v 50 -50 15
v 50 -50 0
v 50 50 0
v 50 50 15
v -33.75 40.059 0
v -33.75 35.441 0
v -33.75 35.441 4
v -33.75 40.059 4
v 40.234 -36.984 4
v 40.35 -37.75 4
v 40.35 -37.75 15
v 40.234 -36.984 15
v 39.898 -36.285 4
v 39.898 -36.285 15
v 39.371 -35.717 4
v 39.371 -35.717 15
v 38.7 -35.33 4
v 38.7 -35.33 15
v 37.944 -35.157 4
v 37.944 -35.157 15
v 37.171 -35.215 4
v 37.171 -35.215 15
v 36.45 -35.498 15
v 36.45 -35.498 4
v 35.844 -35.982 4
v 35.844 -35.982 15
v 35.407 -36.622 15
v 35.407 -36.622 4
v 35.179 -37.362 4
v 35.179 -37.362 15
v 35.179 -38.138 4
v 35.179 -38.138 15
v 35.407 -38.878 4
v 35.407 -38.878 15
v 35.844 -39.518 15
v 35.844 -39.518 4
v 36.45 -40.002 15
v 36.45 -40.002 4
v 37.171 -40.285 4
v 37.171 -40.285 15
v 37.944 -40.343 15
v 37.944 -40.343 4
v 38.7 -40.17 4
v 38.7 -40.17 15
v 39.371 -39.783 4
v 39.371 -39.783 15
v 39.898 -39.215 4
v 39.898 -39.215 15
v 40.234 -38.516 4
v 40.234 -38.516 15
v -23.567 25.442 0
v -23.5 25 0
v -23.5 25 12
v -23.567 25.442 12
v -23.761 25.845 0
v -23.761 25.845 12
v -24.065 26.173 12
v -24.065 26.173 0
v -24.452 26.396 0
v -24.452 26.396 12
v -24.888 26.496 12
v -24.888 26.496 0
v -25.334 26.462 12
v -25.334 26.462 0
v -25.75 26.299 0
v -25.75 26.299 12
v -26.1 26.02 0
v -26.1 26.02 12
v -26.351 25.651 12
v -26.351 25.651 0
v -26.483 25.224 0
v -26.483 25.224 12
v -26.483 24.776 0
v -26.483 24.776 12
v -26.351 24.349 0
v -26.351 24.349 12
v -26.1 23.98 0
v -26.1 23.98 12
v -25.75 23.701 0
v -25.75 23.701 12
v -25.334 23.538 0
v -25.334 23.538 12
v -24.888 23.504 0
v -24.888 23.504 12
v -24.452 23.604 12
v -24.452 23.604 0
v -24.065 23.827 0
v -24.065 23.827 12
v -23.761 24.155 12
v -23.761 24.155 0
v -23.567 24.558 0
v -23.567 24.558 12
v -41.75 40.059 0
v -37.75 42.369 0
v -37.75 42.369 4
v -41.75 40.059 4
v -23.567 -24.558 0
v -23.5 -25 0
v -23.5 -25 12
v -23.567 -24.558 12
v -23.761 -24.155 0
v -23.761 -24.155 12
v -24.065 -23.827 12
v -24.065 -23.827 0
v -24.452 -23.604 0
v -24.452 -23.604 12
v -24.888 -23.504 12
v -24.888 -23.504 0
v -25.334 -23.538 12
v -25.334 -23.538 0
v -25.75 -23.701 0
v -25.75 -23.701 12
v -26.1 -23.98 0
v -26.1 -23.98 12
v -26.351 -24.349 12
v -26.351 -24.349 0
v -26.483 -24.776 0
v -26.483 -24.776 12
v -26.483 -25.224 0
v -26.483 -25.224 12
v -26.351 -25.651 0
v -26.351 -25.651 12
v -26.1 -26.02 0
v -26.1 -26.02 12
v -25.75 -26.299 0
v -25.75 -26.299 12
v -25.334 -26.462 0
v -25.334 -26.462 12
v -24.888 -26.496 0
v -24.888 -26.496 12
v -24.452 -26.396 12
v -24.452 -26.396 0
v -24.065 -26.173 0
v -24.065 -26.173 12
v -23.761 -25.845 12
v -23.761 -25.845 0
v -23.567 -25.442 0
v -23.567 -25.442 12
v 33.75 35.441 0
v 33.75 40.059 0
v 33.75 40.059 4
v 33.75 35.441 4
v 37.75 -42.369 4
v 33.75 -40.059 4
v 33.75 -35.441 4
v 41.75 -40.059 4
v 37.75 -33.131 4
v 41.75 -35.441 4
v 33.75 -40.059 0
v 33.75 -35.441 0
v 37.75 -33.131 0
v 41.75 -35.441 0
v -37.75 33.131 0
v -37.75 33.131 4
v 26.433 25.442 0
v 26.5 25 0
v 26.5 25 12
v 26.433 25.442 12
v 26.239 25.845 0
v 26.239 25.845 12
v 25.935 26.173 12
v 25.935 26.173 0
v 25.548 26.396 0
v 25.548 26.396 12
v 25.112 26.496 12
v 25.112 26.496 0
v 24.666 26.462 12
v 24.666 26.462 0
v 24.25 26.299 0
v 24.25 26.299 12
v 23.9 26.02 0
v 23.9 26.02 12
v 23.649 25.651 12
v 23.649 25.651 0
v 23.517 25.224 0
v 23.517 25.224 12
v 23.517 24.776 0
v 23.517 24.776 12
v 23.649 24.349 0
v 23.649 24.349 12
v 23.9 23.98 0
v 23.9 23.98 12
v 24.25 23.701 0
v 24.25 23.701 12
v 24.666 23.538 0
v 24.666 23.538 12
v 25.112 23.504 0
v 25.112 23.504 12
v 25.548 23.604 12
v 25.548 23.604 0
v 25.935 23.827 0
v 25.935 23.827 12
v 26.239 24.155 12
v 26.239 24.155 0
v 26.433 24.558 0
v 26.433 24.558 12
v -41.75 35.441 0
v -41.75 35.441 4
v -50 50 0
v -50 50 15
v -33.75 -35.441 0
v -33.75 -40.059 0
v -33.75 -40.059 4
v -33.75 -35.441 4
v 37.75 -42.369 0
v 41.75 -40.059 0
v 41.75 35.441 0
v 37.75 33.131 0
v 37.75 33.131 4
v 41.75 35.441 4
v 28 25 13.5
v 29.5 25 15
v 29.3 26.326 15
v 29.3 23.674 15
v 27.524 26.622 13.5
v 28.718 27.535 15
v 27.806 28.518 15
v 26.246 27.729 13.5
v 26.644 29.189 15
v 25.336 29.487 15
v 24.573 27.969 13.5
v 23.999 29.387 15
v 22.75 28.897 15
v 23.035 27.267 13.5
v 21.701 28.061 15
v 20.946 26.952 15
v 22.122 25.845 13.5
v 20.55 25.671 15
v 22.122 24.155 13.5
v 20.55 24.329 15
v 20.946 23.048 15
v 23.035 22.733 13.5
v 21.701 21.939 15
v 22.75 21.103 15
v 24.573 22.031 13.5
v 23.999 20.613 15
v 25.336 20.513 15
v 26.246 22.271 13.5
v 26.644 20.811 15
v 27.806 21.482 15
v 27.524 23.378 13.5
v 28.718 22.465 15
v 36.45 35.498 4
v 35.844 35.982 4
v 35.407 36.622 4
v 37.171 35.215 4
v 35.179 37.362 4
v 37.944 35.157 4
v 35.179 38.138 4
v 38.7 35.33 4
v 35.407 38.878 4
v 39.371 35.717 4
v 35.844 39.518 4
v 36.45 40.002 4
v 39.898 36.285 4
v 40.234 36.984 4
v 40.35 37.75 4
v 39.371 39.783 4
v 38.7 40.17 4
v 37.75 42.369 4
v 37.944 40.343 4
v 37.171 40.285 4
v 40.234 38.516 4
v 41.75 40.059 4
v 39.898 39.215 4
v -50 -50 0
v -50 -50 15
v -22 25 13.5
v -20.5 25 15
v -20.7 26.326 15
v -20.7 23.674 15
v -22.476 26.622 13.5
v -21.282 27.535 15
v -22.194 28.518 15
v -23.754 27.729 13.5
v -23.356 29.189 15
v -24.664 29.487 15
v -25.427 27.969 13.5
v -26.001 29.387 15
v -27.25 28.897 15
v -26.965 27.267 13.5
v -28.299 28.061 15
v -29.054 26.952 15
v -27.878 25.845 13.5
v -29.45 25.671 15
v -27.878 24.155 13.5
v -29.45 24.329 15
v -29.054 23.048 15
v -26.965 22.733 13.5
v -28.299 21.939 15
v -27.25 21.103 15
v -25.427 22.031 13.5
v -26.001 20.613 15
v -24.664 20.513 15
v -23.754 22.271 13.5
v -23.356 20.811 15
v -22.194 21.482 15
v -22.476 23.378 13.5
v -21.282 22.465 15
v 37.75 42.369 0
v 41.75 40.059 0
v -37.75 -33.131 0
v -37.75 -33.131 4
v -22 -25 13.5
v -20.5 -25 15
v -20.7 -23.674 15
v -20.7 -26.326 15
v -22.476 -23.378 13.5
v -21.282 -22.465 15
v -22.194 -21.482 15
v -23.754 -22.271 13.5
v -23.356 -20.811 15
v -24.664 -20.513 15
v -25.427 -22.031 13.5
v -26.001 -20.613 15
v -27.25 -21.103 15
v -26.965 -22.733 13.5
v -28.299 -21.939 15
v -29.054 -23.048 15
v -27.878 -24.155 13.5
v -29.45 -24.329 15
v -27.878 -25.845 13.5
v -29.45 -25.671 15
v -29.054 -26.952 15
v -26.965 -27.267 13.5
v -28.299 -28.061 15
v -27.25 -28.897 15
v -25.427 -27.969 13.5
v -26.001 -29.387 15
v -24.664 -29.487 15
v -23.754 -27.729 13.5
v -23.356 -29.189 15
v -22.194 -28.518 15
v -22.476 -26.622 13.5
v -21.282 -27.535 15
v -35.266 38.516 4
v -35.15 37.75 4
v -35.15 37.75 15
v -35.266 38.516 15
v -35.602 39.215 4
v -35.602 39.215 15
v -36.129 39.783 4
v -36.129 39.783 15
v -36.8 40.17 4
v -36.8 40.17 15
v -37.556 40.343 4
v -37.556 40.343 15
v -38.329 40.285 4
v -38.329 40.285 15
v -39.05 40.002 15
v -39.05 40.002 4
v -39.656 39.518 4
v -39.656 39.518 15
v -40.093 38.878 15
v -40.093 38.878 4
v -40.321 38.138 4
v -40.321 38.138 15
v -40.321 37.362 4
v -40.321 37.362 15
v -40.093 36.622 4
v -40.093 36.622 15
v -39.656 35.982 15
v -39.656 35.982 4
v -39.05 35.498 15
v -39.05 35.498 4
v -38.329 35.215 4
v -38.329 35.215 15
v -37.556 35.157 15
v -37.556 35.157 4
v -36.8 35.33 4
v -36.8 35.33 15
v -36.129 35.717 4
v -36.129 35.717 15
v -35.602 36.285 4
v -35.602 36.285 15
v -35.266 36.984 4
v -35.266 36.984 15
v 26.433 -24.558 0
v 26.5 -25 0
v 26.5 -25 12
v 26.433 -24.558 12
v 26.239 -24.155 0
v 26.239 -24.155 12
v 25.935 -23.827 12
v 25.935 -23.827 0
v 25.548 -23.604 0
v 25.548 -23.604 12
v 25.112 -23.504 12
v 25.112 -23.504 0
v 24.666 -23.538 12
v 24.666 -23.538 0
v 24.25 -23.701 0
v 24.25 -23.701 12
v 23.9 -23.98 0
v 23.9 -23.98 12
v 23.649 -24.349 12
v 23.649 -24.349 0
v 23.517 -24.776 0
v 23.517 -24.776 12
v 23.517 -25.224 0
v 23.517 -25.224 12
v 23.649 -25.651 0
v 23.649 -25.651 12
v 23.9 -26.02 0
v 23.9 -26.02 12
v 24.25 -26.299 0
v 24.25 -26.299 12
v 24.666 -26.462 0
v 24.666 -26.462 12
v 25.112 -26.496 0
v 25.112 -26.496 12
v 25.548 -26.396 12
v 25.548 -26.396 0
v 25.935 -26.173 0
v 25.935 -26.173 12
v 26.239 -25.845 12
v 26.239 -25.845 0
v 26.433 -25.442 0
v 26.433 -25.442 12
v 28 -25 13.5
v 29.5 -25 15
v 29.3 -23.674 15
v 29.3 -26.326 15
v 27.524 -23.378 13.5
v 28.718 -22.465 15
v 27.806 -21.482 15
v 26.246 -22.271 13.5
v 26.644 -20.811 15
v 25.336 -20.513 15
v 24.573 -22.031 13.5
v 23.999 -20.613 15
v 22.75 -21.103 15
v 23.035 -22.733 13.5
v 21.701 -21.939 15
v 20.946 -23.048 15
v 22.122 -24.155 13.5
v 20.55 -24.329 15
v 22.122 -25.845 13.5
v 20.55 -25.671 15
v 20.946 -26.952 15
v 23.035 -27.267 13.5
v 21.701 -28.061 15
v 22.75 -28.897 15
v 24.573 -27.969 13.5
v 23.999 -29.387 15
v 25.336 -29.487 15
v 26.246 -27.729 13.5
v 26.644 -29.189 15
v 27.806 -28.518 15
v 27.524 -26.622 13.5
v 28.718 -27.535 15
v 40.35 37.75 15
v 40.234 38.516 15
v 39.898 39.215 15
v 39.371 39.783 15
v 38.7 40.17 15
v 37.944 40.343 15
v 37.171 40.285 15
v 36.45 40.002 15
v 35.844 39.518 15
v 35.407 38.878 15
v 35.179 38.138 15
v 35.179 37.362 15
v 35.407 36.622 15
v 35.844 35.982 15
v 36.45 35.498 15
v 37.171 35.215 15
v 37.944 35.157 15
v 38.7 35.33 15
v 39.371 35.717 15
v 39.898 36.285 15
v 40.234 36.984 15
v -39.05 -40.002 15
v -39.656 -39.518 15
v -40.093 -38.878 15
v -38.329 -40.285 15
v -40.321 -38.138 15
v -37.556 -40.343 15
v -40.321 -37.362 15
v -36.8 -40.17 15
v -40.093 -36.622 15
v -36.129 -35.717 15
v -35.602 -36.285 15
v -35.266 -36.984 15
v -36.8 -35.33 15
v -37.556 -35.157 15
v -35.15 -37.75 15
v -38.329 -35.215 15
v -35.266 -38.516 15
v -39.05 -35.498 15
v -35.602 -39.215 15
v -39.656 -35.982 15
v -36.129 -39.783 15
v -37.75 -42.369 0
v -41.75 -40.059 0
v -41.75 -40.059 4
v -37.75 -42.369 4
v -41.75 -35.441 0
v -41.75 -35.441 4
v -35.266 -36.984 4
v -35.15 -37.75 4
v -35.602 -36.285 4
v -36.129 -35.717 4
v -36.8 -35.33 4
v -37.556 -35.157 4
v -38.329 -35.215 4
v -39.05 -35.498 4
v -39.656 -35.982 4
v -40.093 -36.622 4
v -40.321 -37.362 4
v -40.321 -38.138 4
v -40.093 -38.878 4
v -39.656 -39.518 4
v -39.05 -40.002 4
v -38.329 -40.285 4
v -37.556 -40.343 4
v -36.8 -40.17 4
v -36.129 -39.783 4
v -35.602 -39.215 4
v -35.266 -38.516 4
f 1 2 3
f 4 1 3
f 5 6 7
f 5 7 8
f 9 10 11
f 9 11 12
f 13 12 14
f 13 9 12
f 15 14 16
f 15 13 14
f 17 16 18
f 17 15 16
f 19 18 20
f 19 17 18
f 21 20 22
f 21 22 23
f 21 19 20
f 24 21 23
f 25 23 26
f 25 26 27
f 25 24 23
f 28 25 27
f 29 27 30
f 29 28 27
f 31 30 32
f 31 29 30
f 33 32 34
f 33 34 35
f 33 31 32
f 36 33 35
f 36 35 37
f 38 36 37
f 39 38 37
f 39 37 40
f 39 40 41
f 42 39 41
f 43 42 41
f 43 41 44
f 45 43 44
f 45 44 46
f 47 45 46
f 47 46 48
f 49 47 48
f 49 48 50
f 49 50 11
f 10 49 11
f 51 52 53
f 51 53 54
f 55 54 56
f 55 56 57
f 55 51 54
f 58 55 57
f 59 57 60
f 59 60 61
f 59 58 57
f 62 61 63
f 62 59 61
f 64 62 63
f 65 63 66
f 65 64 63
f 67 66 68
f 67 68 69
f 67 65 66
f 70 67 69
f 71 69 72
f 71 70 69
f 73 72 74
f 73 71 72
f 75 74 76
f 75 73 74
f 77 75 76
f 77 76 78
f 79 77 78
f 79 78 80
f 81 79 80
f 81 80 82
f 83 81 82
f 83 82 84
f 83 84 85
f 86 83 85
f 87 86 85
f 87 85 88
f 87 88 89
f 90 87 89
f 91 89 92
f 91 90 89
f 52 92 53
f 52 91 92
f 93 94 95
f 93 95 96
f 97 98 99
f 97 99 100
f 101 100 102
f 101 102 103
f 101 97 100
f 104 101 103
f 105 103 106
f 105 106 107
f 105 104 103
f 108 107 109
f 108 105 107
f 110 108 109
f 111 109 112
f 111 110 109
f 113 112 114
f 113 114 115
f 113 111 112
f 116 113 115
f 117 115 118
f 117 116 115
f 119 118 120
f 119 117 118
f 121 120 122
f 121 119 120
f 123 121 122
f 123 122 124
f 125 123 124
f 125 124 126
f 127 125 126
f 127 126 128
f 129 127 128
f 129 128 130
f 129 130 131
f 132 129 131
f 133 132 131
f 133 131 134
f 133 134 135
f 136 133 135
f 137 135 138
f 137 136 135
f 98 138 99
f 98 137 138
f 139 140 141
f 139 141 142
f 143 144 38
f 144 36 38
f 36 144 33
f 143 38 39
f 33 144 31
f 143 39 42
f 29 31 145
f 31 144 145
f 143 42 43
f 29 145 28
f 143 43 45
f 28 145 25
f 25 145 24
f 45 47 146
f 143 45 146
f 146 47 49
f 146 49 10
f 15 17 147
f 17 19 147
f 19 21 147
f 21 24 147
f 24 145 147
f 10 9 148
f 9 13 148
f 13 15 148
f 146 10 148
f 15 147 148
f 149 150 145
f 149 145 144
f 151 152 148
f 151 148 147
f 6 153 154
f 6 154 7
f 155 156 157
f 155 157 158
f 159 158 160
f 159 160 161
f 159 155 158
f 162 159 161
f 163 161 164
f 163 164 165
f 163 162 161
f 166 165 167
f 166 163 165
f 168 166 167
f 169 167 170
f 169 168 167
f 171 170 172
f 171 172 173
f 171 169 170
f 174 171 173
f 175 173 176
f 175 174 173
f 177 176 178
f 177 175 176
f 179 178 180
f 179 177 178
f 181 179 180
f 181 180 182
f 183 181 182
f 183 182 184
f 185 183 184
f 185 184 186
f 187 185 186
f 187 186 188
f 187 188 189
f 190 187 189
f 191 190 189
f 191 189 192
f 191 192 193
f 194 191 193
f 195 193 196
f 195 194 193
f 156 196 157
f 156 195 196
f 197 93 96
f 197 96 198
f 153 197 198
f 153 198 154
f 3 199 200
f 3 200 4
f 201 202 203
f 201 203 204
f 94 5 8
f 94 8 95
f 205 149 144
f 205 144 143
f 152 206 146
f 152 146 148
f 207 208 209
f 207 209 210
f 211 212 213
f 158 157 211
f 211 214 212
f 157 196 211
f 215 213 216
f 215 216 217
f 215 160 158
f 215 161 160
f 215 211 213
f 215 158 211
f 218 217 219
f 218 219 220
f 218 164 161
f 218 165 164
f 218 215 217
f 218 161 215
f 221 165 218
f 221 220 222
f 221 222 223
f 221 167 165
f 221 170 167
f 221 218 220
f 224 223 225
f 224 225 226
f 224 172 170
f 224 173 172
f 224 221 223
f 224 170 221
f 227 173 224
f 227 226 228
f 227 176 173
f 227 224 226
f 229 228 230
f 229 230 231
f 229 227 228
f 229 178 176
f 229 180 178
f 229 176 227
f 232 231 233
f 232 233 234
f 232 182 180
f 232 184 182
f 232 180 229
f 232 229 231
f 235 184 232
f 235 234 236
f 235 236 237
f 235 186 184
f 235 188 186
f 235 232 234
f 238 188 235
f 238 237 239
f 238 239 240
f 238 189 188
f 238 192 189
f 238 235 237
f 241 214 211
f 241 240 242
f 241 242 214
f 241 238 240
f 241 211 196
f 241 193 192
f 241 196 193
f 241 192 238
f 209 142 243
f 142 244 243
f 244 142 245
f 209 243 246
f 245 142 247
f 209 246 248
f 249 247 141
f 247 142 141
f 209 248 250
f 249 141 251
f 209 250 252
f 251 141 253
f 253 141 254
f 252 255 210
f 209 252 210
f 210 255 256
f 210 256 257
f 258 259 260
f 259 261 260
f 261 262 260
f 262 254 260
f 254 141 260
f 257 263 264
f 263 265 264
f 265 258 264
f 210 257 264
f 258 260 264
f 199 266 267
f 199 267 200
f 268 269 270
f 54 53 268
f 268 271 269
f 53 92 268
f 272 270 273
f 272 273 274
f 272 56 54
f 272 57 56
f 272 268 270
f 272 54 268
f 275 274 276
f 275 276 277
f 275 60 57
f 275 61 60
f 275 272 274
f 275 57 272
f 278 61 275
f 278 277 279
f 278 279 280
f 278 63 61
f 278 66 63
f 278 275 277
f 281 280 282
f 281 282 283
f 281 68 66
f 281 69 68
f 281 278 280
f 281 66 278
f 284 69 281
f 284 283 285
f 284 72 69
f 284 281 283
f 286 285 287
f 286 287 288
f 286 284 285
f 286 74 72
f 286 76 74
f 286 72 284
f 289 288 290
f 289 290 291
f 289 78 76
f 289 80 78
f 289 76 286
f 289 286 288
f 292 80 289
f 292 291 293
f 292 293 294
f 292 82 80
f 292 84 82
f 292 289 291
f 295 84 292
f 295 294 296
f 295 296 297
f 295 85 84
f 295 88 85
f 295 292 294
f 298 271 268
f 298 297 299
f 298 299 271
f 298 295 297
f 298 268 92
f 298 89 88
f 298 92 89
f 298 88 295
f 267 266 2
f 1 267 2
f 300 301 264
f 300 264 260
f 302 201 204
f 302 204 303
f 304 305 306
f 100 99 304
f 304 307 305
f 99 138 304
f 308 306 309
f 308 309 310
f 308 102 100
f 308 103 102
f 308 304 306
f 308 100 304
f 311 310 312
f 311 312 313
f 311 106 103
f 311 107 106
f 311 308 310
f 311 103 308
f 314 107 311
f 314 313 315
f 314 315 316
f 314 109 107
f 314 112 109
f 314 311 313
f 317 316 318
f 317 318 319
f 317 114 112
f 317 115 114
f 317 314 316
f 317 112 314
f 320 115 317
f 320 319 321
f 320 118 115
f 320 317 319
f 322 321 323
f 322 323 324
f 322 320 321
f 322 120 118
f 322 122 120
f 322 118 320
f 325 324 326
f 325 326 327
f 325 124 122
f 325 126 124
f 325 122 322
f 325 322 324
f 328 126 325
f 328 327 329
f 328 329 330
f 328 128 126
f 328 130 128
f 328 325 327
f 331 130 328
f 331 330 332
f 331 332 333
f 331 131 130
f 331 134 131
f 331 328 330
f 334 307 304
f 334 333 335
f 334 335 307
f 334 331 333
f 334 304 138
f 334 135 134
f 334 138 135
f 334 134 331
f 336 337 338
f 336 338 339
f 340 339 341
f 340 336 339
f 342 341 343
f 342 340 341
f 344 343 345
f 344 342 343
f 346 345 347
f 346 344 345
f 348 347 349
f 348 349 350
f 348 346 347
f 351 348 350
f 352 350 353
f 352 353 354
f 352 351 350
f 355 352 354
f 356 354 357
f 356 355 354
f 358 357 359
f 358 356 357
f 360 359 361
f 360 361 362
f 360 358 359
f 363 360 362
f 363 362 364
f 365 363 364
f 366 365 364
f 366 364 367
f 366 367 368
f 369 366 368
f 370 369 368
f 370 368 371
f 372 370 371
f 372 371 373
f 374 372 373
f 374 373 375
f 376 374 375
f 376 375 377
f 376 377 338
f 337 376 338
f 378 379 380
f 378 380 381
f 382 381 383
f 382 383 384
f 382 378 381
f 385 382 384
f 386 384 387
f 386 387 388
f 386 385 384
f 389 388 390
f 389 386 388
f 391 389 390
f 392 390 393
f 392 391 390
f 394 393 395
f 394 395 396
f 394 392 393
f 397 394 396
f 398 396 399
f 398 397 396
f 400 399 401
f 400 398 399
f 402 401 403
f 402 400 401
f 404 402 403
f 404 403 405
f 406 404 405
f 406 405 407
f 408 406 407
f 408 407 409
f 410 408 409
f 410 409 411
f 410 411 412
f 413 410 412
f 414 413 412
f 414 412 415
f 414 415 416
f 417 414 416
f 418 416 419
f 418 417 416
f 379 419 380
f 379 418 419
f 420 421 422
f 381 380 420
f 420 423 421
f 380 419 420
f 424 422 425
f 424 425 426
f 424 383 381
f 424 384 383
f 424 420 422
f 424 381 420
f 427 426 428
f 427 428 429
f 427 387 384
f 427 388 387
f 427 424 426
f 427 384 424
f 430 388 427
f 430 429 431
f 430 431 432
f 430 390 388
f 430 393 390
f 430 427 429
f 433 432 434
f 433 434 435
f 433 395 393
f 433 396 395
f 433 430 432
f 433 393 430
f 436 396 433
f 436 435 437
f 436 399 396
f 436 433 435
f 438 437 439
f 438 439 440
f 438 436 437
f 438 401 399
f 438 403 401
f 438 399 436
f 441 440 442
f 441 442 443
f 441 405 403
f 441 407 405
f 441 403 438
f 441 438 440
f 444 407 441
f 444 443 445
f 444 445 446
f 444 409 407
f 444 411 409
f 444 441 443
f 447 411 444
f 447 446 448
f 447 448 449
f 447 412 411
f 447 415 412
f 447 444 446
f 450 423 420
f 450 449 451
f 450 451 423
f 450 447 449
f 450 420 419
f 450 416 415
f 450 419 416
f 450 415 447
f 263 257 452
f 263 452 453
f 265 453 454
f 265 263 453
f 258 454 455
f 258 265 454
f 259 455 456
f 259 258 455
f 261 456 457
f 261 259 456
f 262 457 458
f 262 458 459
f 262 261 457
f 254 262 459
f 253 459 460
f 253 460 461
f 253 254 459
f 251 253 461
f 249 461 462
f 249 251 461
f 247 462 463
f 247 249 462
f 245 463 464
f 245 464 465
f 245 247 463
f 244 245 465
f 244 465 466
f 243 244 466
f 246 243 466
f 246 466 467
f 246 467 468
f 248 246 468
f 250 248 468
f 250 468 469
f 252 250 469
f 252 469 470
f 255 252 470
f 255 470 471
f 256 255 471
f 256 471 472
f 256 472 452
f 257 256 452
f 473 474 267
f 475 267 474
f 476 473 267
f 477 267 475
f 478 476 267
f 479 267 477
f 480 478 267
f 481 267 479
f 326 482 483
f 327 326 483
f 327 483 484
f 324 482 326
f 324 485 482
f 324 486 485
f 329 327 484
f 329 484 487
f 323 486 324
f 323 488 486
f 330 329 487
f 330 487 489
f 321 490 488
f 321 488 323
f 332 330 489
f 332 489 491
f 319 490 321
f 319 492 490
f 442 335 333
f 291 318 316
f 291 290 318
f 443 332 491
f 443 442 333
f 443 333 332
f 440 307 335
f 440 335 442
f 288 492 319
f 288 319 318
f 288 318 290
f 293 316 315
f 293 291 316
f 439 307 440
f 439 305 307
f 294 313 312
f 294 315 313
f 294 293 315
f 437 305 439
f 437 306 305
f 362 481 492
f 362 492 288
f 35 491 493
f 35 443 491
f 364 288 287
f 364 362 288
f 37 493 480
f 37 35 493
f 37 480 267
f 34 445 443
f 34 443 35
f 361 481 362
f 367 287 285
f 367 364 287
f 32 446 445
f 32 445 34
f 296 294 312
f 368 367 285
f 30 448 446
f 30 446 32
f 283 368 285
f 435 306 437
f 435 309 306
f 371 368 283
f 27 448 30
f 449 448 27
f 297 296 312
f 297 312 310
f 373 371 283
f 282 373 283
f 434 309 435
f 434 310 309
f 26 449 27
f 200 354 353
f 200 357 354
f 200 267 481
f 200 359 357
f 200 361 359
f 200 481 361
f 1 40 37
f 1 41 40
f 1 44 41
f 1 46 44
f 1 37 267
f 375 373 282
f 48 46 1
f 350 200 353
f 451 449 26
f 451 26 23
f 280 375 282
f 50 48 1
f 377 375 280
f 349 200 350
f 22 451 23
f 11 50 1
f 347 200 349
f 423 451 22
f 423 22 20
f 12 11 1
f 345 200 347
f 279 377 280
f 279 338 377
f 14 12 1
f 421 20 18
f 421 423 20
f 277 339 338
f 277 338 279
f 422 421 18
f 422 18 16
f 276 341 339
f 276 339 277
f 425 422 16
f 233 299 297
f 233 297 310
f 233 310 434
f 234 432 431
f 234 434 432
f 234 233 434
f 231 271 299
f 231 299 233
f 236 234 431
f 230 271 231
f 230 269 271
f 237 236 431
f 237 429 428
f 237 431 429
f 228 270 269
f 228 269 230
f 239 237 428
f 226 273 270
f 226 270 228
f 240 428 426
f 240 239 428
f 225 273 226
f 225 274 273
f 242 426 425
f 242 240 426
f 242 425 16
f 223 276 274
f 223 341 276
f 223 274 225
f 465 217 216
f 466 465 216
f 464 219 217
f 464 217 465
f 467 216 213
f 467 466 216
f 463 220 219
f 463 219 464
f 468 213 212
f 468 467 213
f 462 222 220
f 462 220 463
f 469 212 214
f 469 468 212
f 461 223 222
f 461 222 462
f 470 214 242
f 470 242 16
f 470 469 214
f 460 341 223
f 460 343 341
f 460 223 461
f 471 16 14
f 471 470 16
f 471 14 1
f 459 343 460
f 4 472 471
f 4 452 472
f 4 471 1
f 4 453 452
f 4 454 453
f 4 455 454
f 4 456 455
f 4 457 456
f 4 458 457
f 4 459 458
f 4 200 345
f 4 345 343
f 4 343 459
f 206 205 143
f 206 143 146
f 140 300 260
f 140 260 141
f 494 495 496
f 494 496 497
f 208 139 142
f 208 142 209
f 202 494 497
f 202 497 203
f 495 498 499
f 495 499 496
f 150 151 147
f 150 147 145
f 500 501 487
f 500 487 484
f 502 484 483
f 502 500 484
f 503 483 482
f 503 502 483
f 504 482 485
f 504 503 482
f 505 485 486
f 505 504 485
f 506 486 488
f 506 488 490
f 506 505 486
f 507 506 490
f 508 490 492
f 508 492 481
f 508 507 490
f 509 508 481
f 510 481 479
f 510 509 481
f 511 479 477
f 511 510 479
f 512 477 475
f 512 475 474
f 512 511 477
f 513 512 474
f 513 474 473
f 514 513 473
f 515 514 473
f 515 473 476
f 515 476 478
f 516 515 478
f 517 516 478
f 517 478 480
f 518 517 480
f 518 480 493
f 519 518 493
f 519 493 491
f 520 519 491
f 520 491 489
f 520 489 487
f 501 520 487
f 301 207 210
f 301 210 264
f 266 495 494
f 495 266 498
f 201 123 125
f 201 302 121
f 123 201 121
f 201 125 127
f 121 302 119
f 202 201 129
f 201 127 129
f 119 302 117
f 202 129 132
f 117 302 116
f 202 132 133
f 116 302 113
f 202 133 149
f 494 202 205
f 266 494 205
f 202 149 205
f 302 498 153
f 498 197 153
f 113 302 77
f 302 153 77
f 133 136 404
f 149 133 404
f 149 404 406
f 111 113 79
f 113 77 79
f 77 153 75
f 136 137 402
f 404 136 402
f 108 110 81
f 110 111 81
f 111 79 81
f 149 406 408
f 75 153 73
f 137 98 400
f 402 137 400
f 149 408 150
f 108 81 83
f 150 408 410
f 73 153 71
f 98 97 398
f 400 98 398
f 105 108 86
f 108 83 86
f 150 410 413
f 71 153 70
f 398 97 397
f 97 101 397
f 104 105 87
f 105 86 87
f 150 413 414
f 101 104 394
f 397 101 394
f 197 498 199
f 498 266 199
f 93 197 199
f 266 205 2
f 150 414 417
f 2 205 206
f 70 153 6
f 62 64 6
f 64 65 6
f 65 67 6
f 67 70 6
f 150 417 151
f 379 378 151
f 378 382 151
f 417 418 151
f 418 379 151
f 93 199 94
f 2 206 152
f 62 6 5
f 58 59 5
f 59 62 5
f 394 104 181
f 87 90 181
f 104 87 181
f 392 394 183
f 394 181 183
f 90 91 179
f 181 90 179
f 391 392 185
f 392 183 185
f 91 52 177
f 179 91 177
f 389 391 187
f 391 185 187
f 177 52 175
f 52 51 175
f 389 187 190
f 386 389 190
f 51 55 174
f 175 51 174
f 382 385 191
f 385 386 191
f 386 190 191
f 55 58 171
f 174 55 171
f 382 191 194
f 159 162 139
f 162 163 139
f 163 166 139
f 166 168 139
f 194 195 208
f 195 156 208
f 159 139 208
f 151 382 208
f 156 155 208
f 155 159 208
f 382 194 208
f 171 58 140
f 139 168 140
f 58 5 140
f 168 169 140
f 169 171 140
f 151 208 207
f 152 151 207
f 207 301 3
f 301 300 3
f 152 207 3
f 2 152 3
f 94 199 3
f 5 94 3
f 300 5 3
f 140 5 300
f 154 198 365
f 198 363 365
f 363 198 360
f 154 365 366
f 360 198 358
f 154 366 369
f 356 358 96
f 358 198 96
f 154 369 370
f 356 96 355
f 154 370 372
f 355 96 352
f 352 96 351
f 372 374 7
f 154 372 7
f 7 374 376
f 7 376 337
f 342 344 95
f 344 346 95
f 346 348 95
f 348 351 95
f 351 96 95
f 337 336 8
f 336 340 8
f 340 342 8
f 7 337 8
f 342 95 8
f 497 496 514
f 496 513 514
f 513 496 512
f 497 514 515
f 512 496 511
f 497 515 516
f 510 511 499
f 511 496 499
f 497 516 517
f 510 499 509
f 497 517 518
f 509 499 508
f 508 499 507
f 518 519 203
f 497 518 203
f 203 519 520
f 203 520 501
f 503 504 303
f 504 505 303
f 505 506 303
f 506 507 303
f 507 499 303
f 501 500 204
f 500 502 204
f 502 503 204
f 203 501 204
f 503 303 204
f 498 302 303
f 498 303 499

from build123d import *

# Parameters (mm, degrees)
F0_W     = 100
F0_H     = 100
F0_R     = 1.5
F0_R_2   = 2.6
F1_DEPTH = 15
F2_DEPTH = 4
F3_SIZE  = 3


with BuildPart() as f1:
    # F0 (on Top) → F1 (new body)
    with BuildSketch(Plane.XY):
        Rectangle(F0_W, F0_H)
        Polygon((-37.75, -33.131198), (-33.75, -35.440599), (-33.75, -40.059401), (-37.75, -42.368802), (-41.75, -40.059401), (-41.75, -35.440599), align=None, mode=Mode.SUBTRACT)
        with Locations((-25, -25)):
            Circle(F0_R, mode=Mode.SUBTRACT)
        Polygon((37.75, -33.131198), (41.75, -35.440599), (41.75, -40.059401), (37.75, -42.368802), (33.75, -40.059401), (33.75, -35.440599), align=None, mode=Mode.SUBTRACT)
        with Locations((25, -25)):
            Circle(F0_R, mode=Mode.SUBTRACT)
        Polygon((-37.75, 33.131198), (-41.75, 35.440599), (-41.75, 40.059401), (-37.75, 42.368802), (-33.75, 40.059401), (-33.75, 35.440599), align=None, mode=Mode.SUBTRACT)
        with Locations((-25, 25)):
            Circle(F0_R, mode=Mode.SUBTRACT)
        with Locations((25, 25)):
            Circle(F0_R, mode=Mode.SUBTRACT)
        Polygon((37.75, 42.368802), (41.75, 40.059401), (41.75, 35.440599), (37.75, 33.131198), (33.75, 35.440599), (33.75, 40.059401), align=None, mode=Mode.SUBTRACT)
        Polygon((41.75, 35.440599), (41.75, 40.059401), (37.75, 42.368802), (33.75, 40.059401), (33.75, 35.440599), (37.75, 33.131198), align=None)
        with Locations((37.75, 37.75)):
            Circle(F0_R_2, mode=Mode.SUBTRACT)
        Polygon((-41.75, 40.059401), (-41.75, 35.440599), (-37.75, 33.131198), (-33.75, 35.440599), (-33.75, 40.059401), (-37.75, 42.368802), align=None)
        with Locations((-37.75, 37.75)):
            Circle(F0_R_2, mode=Mode.SUBTRACT)
        Polygon((-33.75, -40.059401), (-33.75, -35.440599), (-37.75, -33.131198), (-41.75, -35.440599), (-41.75, -40.059401), (-37.75, -42.368802), align=None)
        with Locations((-37.75, -37.75)):
            Circle(F0_R_2, mode=Mode.SUBTRACT)
        Polygon((41.75, -40.059401), (41.75, -35.440599), (37.75, -33.131198), (33.75, -35.440599), (33.75, -40.059401), (37.75, -42.368802), align=None)
        with Locations((37.75, -37.75)):
            Circle(F0_R_2, mode=Mode.SUBTRACT)
    extrude(amount=F1_DEPTH)

    # F0 (on Top) → F2 (cut)
    with BuildSketch(Plane.XY):
        Polygon((-41.75, 40.059401), (-41.75, 35.440599), (-37.75, 33.131198), (-33.75, 35.440599), (-33.75, 40.059401), (-37.75, 42.368802), align=None)
        with Locations((-37.75, 37.75)):
            Circle(F0_R_2, mode=Mode.SUBTRACT)
        Polygon((41.75, 35.440599), (41.75, 40.059401), (37.75, 42.368802), (33.75, 40.059401), (33.75, 35.440599), (37.75, 33.131198), align=None)
        with Locations((37.75, 37.75)):
            Circle(F0_R_2, mode=Mode.SUBTRACT)
        Polygon((41.75, -40.059401), (41.75, -35.440599), (37.75, -33.131198), (33.75, -35.440599), (33.75, -40.059401), (37.75, -42.368802), align=None)
        with Locations((37.75, -37.75)):
            Circle(F0_R_2, mode=Mode.SUBTRACT)
        Polygon((-33.75, -40.059401), (-33.75, -35.440599), (-37.75, -33.131198), (-41.75, -35.440599), (-41.75, -40.059401), (-37.75, -42.368802), align=None)
        with Locations((-37.75, -37.75)):
            Circle(F0_R_2, mode=Mode.SUBTRACT)
    extrude(amount=F2_DEPTH, mode=Mode.SUBTRACT)

    # F3
    f3_edges = [f1.edges().sort_by_distance(p)[0] for p in [
        (-26.5, 25, 15),
        (23.5, 25, 15),
        (23.5, -25, 15),
        (-26.5, -25, 15),
    ]]
    chamfer(f3_edges, length=F3_SIZE)


solid = f1.part
